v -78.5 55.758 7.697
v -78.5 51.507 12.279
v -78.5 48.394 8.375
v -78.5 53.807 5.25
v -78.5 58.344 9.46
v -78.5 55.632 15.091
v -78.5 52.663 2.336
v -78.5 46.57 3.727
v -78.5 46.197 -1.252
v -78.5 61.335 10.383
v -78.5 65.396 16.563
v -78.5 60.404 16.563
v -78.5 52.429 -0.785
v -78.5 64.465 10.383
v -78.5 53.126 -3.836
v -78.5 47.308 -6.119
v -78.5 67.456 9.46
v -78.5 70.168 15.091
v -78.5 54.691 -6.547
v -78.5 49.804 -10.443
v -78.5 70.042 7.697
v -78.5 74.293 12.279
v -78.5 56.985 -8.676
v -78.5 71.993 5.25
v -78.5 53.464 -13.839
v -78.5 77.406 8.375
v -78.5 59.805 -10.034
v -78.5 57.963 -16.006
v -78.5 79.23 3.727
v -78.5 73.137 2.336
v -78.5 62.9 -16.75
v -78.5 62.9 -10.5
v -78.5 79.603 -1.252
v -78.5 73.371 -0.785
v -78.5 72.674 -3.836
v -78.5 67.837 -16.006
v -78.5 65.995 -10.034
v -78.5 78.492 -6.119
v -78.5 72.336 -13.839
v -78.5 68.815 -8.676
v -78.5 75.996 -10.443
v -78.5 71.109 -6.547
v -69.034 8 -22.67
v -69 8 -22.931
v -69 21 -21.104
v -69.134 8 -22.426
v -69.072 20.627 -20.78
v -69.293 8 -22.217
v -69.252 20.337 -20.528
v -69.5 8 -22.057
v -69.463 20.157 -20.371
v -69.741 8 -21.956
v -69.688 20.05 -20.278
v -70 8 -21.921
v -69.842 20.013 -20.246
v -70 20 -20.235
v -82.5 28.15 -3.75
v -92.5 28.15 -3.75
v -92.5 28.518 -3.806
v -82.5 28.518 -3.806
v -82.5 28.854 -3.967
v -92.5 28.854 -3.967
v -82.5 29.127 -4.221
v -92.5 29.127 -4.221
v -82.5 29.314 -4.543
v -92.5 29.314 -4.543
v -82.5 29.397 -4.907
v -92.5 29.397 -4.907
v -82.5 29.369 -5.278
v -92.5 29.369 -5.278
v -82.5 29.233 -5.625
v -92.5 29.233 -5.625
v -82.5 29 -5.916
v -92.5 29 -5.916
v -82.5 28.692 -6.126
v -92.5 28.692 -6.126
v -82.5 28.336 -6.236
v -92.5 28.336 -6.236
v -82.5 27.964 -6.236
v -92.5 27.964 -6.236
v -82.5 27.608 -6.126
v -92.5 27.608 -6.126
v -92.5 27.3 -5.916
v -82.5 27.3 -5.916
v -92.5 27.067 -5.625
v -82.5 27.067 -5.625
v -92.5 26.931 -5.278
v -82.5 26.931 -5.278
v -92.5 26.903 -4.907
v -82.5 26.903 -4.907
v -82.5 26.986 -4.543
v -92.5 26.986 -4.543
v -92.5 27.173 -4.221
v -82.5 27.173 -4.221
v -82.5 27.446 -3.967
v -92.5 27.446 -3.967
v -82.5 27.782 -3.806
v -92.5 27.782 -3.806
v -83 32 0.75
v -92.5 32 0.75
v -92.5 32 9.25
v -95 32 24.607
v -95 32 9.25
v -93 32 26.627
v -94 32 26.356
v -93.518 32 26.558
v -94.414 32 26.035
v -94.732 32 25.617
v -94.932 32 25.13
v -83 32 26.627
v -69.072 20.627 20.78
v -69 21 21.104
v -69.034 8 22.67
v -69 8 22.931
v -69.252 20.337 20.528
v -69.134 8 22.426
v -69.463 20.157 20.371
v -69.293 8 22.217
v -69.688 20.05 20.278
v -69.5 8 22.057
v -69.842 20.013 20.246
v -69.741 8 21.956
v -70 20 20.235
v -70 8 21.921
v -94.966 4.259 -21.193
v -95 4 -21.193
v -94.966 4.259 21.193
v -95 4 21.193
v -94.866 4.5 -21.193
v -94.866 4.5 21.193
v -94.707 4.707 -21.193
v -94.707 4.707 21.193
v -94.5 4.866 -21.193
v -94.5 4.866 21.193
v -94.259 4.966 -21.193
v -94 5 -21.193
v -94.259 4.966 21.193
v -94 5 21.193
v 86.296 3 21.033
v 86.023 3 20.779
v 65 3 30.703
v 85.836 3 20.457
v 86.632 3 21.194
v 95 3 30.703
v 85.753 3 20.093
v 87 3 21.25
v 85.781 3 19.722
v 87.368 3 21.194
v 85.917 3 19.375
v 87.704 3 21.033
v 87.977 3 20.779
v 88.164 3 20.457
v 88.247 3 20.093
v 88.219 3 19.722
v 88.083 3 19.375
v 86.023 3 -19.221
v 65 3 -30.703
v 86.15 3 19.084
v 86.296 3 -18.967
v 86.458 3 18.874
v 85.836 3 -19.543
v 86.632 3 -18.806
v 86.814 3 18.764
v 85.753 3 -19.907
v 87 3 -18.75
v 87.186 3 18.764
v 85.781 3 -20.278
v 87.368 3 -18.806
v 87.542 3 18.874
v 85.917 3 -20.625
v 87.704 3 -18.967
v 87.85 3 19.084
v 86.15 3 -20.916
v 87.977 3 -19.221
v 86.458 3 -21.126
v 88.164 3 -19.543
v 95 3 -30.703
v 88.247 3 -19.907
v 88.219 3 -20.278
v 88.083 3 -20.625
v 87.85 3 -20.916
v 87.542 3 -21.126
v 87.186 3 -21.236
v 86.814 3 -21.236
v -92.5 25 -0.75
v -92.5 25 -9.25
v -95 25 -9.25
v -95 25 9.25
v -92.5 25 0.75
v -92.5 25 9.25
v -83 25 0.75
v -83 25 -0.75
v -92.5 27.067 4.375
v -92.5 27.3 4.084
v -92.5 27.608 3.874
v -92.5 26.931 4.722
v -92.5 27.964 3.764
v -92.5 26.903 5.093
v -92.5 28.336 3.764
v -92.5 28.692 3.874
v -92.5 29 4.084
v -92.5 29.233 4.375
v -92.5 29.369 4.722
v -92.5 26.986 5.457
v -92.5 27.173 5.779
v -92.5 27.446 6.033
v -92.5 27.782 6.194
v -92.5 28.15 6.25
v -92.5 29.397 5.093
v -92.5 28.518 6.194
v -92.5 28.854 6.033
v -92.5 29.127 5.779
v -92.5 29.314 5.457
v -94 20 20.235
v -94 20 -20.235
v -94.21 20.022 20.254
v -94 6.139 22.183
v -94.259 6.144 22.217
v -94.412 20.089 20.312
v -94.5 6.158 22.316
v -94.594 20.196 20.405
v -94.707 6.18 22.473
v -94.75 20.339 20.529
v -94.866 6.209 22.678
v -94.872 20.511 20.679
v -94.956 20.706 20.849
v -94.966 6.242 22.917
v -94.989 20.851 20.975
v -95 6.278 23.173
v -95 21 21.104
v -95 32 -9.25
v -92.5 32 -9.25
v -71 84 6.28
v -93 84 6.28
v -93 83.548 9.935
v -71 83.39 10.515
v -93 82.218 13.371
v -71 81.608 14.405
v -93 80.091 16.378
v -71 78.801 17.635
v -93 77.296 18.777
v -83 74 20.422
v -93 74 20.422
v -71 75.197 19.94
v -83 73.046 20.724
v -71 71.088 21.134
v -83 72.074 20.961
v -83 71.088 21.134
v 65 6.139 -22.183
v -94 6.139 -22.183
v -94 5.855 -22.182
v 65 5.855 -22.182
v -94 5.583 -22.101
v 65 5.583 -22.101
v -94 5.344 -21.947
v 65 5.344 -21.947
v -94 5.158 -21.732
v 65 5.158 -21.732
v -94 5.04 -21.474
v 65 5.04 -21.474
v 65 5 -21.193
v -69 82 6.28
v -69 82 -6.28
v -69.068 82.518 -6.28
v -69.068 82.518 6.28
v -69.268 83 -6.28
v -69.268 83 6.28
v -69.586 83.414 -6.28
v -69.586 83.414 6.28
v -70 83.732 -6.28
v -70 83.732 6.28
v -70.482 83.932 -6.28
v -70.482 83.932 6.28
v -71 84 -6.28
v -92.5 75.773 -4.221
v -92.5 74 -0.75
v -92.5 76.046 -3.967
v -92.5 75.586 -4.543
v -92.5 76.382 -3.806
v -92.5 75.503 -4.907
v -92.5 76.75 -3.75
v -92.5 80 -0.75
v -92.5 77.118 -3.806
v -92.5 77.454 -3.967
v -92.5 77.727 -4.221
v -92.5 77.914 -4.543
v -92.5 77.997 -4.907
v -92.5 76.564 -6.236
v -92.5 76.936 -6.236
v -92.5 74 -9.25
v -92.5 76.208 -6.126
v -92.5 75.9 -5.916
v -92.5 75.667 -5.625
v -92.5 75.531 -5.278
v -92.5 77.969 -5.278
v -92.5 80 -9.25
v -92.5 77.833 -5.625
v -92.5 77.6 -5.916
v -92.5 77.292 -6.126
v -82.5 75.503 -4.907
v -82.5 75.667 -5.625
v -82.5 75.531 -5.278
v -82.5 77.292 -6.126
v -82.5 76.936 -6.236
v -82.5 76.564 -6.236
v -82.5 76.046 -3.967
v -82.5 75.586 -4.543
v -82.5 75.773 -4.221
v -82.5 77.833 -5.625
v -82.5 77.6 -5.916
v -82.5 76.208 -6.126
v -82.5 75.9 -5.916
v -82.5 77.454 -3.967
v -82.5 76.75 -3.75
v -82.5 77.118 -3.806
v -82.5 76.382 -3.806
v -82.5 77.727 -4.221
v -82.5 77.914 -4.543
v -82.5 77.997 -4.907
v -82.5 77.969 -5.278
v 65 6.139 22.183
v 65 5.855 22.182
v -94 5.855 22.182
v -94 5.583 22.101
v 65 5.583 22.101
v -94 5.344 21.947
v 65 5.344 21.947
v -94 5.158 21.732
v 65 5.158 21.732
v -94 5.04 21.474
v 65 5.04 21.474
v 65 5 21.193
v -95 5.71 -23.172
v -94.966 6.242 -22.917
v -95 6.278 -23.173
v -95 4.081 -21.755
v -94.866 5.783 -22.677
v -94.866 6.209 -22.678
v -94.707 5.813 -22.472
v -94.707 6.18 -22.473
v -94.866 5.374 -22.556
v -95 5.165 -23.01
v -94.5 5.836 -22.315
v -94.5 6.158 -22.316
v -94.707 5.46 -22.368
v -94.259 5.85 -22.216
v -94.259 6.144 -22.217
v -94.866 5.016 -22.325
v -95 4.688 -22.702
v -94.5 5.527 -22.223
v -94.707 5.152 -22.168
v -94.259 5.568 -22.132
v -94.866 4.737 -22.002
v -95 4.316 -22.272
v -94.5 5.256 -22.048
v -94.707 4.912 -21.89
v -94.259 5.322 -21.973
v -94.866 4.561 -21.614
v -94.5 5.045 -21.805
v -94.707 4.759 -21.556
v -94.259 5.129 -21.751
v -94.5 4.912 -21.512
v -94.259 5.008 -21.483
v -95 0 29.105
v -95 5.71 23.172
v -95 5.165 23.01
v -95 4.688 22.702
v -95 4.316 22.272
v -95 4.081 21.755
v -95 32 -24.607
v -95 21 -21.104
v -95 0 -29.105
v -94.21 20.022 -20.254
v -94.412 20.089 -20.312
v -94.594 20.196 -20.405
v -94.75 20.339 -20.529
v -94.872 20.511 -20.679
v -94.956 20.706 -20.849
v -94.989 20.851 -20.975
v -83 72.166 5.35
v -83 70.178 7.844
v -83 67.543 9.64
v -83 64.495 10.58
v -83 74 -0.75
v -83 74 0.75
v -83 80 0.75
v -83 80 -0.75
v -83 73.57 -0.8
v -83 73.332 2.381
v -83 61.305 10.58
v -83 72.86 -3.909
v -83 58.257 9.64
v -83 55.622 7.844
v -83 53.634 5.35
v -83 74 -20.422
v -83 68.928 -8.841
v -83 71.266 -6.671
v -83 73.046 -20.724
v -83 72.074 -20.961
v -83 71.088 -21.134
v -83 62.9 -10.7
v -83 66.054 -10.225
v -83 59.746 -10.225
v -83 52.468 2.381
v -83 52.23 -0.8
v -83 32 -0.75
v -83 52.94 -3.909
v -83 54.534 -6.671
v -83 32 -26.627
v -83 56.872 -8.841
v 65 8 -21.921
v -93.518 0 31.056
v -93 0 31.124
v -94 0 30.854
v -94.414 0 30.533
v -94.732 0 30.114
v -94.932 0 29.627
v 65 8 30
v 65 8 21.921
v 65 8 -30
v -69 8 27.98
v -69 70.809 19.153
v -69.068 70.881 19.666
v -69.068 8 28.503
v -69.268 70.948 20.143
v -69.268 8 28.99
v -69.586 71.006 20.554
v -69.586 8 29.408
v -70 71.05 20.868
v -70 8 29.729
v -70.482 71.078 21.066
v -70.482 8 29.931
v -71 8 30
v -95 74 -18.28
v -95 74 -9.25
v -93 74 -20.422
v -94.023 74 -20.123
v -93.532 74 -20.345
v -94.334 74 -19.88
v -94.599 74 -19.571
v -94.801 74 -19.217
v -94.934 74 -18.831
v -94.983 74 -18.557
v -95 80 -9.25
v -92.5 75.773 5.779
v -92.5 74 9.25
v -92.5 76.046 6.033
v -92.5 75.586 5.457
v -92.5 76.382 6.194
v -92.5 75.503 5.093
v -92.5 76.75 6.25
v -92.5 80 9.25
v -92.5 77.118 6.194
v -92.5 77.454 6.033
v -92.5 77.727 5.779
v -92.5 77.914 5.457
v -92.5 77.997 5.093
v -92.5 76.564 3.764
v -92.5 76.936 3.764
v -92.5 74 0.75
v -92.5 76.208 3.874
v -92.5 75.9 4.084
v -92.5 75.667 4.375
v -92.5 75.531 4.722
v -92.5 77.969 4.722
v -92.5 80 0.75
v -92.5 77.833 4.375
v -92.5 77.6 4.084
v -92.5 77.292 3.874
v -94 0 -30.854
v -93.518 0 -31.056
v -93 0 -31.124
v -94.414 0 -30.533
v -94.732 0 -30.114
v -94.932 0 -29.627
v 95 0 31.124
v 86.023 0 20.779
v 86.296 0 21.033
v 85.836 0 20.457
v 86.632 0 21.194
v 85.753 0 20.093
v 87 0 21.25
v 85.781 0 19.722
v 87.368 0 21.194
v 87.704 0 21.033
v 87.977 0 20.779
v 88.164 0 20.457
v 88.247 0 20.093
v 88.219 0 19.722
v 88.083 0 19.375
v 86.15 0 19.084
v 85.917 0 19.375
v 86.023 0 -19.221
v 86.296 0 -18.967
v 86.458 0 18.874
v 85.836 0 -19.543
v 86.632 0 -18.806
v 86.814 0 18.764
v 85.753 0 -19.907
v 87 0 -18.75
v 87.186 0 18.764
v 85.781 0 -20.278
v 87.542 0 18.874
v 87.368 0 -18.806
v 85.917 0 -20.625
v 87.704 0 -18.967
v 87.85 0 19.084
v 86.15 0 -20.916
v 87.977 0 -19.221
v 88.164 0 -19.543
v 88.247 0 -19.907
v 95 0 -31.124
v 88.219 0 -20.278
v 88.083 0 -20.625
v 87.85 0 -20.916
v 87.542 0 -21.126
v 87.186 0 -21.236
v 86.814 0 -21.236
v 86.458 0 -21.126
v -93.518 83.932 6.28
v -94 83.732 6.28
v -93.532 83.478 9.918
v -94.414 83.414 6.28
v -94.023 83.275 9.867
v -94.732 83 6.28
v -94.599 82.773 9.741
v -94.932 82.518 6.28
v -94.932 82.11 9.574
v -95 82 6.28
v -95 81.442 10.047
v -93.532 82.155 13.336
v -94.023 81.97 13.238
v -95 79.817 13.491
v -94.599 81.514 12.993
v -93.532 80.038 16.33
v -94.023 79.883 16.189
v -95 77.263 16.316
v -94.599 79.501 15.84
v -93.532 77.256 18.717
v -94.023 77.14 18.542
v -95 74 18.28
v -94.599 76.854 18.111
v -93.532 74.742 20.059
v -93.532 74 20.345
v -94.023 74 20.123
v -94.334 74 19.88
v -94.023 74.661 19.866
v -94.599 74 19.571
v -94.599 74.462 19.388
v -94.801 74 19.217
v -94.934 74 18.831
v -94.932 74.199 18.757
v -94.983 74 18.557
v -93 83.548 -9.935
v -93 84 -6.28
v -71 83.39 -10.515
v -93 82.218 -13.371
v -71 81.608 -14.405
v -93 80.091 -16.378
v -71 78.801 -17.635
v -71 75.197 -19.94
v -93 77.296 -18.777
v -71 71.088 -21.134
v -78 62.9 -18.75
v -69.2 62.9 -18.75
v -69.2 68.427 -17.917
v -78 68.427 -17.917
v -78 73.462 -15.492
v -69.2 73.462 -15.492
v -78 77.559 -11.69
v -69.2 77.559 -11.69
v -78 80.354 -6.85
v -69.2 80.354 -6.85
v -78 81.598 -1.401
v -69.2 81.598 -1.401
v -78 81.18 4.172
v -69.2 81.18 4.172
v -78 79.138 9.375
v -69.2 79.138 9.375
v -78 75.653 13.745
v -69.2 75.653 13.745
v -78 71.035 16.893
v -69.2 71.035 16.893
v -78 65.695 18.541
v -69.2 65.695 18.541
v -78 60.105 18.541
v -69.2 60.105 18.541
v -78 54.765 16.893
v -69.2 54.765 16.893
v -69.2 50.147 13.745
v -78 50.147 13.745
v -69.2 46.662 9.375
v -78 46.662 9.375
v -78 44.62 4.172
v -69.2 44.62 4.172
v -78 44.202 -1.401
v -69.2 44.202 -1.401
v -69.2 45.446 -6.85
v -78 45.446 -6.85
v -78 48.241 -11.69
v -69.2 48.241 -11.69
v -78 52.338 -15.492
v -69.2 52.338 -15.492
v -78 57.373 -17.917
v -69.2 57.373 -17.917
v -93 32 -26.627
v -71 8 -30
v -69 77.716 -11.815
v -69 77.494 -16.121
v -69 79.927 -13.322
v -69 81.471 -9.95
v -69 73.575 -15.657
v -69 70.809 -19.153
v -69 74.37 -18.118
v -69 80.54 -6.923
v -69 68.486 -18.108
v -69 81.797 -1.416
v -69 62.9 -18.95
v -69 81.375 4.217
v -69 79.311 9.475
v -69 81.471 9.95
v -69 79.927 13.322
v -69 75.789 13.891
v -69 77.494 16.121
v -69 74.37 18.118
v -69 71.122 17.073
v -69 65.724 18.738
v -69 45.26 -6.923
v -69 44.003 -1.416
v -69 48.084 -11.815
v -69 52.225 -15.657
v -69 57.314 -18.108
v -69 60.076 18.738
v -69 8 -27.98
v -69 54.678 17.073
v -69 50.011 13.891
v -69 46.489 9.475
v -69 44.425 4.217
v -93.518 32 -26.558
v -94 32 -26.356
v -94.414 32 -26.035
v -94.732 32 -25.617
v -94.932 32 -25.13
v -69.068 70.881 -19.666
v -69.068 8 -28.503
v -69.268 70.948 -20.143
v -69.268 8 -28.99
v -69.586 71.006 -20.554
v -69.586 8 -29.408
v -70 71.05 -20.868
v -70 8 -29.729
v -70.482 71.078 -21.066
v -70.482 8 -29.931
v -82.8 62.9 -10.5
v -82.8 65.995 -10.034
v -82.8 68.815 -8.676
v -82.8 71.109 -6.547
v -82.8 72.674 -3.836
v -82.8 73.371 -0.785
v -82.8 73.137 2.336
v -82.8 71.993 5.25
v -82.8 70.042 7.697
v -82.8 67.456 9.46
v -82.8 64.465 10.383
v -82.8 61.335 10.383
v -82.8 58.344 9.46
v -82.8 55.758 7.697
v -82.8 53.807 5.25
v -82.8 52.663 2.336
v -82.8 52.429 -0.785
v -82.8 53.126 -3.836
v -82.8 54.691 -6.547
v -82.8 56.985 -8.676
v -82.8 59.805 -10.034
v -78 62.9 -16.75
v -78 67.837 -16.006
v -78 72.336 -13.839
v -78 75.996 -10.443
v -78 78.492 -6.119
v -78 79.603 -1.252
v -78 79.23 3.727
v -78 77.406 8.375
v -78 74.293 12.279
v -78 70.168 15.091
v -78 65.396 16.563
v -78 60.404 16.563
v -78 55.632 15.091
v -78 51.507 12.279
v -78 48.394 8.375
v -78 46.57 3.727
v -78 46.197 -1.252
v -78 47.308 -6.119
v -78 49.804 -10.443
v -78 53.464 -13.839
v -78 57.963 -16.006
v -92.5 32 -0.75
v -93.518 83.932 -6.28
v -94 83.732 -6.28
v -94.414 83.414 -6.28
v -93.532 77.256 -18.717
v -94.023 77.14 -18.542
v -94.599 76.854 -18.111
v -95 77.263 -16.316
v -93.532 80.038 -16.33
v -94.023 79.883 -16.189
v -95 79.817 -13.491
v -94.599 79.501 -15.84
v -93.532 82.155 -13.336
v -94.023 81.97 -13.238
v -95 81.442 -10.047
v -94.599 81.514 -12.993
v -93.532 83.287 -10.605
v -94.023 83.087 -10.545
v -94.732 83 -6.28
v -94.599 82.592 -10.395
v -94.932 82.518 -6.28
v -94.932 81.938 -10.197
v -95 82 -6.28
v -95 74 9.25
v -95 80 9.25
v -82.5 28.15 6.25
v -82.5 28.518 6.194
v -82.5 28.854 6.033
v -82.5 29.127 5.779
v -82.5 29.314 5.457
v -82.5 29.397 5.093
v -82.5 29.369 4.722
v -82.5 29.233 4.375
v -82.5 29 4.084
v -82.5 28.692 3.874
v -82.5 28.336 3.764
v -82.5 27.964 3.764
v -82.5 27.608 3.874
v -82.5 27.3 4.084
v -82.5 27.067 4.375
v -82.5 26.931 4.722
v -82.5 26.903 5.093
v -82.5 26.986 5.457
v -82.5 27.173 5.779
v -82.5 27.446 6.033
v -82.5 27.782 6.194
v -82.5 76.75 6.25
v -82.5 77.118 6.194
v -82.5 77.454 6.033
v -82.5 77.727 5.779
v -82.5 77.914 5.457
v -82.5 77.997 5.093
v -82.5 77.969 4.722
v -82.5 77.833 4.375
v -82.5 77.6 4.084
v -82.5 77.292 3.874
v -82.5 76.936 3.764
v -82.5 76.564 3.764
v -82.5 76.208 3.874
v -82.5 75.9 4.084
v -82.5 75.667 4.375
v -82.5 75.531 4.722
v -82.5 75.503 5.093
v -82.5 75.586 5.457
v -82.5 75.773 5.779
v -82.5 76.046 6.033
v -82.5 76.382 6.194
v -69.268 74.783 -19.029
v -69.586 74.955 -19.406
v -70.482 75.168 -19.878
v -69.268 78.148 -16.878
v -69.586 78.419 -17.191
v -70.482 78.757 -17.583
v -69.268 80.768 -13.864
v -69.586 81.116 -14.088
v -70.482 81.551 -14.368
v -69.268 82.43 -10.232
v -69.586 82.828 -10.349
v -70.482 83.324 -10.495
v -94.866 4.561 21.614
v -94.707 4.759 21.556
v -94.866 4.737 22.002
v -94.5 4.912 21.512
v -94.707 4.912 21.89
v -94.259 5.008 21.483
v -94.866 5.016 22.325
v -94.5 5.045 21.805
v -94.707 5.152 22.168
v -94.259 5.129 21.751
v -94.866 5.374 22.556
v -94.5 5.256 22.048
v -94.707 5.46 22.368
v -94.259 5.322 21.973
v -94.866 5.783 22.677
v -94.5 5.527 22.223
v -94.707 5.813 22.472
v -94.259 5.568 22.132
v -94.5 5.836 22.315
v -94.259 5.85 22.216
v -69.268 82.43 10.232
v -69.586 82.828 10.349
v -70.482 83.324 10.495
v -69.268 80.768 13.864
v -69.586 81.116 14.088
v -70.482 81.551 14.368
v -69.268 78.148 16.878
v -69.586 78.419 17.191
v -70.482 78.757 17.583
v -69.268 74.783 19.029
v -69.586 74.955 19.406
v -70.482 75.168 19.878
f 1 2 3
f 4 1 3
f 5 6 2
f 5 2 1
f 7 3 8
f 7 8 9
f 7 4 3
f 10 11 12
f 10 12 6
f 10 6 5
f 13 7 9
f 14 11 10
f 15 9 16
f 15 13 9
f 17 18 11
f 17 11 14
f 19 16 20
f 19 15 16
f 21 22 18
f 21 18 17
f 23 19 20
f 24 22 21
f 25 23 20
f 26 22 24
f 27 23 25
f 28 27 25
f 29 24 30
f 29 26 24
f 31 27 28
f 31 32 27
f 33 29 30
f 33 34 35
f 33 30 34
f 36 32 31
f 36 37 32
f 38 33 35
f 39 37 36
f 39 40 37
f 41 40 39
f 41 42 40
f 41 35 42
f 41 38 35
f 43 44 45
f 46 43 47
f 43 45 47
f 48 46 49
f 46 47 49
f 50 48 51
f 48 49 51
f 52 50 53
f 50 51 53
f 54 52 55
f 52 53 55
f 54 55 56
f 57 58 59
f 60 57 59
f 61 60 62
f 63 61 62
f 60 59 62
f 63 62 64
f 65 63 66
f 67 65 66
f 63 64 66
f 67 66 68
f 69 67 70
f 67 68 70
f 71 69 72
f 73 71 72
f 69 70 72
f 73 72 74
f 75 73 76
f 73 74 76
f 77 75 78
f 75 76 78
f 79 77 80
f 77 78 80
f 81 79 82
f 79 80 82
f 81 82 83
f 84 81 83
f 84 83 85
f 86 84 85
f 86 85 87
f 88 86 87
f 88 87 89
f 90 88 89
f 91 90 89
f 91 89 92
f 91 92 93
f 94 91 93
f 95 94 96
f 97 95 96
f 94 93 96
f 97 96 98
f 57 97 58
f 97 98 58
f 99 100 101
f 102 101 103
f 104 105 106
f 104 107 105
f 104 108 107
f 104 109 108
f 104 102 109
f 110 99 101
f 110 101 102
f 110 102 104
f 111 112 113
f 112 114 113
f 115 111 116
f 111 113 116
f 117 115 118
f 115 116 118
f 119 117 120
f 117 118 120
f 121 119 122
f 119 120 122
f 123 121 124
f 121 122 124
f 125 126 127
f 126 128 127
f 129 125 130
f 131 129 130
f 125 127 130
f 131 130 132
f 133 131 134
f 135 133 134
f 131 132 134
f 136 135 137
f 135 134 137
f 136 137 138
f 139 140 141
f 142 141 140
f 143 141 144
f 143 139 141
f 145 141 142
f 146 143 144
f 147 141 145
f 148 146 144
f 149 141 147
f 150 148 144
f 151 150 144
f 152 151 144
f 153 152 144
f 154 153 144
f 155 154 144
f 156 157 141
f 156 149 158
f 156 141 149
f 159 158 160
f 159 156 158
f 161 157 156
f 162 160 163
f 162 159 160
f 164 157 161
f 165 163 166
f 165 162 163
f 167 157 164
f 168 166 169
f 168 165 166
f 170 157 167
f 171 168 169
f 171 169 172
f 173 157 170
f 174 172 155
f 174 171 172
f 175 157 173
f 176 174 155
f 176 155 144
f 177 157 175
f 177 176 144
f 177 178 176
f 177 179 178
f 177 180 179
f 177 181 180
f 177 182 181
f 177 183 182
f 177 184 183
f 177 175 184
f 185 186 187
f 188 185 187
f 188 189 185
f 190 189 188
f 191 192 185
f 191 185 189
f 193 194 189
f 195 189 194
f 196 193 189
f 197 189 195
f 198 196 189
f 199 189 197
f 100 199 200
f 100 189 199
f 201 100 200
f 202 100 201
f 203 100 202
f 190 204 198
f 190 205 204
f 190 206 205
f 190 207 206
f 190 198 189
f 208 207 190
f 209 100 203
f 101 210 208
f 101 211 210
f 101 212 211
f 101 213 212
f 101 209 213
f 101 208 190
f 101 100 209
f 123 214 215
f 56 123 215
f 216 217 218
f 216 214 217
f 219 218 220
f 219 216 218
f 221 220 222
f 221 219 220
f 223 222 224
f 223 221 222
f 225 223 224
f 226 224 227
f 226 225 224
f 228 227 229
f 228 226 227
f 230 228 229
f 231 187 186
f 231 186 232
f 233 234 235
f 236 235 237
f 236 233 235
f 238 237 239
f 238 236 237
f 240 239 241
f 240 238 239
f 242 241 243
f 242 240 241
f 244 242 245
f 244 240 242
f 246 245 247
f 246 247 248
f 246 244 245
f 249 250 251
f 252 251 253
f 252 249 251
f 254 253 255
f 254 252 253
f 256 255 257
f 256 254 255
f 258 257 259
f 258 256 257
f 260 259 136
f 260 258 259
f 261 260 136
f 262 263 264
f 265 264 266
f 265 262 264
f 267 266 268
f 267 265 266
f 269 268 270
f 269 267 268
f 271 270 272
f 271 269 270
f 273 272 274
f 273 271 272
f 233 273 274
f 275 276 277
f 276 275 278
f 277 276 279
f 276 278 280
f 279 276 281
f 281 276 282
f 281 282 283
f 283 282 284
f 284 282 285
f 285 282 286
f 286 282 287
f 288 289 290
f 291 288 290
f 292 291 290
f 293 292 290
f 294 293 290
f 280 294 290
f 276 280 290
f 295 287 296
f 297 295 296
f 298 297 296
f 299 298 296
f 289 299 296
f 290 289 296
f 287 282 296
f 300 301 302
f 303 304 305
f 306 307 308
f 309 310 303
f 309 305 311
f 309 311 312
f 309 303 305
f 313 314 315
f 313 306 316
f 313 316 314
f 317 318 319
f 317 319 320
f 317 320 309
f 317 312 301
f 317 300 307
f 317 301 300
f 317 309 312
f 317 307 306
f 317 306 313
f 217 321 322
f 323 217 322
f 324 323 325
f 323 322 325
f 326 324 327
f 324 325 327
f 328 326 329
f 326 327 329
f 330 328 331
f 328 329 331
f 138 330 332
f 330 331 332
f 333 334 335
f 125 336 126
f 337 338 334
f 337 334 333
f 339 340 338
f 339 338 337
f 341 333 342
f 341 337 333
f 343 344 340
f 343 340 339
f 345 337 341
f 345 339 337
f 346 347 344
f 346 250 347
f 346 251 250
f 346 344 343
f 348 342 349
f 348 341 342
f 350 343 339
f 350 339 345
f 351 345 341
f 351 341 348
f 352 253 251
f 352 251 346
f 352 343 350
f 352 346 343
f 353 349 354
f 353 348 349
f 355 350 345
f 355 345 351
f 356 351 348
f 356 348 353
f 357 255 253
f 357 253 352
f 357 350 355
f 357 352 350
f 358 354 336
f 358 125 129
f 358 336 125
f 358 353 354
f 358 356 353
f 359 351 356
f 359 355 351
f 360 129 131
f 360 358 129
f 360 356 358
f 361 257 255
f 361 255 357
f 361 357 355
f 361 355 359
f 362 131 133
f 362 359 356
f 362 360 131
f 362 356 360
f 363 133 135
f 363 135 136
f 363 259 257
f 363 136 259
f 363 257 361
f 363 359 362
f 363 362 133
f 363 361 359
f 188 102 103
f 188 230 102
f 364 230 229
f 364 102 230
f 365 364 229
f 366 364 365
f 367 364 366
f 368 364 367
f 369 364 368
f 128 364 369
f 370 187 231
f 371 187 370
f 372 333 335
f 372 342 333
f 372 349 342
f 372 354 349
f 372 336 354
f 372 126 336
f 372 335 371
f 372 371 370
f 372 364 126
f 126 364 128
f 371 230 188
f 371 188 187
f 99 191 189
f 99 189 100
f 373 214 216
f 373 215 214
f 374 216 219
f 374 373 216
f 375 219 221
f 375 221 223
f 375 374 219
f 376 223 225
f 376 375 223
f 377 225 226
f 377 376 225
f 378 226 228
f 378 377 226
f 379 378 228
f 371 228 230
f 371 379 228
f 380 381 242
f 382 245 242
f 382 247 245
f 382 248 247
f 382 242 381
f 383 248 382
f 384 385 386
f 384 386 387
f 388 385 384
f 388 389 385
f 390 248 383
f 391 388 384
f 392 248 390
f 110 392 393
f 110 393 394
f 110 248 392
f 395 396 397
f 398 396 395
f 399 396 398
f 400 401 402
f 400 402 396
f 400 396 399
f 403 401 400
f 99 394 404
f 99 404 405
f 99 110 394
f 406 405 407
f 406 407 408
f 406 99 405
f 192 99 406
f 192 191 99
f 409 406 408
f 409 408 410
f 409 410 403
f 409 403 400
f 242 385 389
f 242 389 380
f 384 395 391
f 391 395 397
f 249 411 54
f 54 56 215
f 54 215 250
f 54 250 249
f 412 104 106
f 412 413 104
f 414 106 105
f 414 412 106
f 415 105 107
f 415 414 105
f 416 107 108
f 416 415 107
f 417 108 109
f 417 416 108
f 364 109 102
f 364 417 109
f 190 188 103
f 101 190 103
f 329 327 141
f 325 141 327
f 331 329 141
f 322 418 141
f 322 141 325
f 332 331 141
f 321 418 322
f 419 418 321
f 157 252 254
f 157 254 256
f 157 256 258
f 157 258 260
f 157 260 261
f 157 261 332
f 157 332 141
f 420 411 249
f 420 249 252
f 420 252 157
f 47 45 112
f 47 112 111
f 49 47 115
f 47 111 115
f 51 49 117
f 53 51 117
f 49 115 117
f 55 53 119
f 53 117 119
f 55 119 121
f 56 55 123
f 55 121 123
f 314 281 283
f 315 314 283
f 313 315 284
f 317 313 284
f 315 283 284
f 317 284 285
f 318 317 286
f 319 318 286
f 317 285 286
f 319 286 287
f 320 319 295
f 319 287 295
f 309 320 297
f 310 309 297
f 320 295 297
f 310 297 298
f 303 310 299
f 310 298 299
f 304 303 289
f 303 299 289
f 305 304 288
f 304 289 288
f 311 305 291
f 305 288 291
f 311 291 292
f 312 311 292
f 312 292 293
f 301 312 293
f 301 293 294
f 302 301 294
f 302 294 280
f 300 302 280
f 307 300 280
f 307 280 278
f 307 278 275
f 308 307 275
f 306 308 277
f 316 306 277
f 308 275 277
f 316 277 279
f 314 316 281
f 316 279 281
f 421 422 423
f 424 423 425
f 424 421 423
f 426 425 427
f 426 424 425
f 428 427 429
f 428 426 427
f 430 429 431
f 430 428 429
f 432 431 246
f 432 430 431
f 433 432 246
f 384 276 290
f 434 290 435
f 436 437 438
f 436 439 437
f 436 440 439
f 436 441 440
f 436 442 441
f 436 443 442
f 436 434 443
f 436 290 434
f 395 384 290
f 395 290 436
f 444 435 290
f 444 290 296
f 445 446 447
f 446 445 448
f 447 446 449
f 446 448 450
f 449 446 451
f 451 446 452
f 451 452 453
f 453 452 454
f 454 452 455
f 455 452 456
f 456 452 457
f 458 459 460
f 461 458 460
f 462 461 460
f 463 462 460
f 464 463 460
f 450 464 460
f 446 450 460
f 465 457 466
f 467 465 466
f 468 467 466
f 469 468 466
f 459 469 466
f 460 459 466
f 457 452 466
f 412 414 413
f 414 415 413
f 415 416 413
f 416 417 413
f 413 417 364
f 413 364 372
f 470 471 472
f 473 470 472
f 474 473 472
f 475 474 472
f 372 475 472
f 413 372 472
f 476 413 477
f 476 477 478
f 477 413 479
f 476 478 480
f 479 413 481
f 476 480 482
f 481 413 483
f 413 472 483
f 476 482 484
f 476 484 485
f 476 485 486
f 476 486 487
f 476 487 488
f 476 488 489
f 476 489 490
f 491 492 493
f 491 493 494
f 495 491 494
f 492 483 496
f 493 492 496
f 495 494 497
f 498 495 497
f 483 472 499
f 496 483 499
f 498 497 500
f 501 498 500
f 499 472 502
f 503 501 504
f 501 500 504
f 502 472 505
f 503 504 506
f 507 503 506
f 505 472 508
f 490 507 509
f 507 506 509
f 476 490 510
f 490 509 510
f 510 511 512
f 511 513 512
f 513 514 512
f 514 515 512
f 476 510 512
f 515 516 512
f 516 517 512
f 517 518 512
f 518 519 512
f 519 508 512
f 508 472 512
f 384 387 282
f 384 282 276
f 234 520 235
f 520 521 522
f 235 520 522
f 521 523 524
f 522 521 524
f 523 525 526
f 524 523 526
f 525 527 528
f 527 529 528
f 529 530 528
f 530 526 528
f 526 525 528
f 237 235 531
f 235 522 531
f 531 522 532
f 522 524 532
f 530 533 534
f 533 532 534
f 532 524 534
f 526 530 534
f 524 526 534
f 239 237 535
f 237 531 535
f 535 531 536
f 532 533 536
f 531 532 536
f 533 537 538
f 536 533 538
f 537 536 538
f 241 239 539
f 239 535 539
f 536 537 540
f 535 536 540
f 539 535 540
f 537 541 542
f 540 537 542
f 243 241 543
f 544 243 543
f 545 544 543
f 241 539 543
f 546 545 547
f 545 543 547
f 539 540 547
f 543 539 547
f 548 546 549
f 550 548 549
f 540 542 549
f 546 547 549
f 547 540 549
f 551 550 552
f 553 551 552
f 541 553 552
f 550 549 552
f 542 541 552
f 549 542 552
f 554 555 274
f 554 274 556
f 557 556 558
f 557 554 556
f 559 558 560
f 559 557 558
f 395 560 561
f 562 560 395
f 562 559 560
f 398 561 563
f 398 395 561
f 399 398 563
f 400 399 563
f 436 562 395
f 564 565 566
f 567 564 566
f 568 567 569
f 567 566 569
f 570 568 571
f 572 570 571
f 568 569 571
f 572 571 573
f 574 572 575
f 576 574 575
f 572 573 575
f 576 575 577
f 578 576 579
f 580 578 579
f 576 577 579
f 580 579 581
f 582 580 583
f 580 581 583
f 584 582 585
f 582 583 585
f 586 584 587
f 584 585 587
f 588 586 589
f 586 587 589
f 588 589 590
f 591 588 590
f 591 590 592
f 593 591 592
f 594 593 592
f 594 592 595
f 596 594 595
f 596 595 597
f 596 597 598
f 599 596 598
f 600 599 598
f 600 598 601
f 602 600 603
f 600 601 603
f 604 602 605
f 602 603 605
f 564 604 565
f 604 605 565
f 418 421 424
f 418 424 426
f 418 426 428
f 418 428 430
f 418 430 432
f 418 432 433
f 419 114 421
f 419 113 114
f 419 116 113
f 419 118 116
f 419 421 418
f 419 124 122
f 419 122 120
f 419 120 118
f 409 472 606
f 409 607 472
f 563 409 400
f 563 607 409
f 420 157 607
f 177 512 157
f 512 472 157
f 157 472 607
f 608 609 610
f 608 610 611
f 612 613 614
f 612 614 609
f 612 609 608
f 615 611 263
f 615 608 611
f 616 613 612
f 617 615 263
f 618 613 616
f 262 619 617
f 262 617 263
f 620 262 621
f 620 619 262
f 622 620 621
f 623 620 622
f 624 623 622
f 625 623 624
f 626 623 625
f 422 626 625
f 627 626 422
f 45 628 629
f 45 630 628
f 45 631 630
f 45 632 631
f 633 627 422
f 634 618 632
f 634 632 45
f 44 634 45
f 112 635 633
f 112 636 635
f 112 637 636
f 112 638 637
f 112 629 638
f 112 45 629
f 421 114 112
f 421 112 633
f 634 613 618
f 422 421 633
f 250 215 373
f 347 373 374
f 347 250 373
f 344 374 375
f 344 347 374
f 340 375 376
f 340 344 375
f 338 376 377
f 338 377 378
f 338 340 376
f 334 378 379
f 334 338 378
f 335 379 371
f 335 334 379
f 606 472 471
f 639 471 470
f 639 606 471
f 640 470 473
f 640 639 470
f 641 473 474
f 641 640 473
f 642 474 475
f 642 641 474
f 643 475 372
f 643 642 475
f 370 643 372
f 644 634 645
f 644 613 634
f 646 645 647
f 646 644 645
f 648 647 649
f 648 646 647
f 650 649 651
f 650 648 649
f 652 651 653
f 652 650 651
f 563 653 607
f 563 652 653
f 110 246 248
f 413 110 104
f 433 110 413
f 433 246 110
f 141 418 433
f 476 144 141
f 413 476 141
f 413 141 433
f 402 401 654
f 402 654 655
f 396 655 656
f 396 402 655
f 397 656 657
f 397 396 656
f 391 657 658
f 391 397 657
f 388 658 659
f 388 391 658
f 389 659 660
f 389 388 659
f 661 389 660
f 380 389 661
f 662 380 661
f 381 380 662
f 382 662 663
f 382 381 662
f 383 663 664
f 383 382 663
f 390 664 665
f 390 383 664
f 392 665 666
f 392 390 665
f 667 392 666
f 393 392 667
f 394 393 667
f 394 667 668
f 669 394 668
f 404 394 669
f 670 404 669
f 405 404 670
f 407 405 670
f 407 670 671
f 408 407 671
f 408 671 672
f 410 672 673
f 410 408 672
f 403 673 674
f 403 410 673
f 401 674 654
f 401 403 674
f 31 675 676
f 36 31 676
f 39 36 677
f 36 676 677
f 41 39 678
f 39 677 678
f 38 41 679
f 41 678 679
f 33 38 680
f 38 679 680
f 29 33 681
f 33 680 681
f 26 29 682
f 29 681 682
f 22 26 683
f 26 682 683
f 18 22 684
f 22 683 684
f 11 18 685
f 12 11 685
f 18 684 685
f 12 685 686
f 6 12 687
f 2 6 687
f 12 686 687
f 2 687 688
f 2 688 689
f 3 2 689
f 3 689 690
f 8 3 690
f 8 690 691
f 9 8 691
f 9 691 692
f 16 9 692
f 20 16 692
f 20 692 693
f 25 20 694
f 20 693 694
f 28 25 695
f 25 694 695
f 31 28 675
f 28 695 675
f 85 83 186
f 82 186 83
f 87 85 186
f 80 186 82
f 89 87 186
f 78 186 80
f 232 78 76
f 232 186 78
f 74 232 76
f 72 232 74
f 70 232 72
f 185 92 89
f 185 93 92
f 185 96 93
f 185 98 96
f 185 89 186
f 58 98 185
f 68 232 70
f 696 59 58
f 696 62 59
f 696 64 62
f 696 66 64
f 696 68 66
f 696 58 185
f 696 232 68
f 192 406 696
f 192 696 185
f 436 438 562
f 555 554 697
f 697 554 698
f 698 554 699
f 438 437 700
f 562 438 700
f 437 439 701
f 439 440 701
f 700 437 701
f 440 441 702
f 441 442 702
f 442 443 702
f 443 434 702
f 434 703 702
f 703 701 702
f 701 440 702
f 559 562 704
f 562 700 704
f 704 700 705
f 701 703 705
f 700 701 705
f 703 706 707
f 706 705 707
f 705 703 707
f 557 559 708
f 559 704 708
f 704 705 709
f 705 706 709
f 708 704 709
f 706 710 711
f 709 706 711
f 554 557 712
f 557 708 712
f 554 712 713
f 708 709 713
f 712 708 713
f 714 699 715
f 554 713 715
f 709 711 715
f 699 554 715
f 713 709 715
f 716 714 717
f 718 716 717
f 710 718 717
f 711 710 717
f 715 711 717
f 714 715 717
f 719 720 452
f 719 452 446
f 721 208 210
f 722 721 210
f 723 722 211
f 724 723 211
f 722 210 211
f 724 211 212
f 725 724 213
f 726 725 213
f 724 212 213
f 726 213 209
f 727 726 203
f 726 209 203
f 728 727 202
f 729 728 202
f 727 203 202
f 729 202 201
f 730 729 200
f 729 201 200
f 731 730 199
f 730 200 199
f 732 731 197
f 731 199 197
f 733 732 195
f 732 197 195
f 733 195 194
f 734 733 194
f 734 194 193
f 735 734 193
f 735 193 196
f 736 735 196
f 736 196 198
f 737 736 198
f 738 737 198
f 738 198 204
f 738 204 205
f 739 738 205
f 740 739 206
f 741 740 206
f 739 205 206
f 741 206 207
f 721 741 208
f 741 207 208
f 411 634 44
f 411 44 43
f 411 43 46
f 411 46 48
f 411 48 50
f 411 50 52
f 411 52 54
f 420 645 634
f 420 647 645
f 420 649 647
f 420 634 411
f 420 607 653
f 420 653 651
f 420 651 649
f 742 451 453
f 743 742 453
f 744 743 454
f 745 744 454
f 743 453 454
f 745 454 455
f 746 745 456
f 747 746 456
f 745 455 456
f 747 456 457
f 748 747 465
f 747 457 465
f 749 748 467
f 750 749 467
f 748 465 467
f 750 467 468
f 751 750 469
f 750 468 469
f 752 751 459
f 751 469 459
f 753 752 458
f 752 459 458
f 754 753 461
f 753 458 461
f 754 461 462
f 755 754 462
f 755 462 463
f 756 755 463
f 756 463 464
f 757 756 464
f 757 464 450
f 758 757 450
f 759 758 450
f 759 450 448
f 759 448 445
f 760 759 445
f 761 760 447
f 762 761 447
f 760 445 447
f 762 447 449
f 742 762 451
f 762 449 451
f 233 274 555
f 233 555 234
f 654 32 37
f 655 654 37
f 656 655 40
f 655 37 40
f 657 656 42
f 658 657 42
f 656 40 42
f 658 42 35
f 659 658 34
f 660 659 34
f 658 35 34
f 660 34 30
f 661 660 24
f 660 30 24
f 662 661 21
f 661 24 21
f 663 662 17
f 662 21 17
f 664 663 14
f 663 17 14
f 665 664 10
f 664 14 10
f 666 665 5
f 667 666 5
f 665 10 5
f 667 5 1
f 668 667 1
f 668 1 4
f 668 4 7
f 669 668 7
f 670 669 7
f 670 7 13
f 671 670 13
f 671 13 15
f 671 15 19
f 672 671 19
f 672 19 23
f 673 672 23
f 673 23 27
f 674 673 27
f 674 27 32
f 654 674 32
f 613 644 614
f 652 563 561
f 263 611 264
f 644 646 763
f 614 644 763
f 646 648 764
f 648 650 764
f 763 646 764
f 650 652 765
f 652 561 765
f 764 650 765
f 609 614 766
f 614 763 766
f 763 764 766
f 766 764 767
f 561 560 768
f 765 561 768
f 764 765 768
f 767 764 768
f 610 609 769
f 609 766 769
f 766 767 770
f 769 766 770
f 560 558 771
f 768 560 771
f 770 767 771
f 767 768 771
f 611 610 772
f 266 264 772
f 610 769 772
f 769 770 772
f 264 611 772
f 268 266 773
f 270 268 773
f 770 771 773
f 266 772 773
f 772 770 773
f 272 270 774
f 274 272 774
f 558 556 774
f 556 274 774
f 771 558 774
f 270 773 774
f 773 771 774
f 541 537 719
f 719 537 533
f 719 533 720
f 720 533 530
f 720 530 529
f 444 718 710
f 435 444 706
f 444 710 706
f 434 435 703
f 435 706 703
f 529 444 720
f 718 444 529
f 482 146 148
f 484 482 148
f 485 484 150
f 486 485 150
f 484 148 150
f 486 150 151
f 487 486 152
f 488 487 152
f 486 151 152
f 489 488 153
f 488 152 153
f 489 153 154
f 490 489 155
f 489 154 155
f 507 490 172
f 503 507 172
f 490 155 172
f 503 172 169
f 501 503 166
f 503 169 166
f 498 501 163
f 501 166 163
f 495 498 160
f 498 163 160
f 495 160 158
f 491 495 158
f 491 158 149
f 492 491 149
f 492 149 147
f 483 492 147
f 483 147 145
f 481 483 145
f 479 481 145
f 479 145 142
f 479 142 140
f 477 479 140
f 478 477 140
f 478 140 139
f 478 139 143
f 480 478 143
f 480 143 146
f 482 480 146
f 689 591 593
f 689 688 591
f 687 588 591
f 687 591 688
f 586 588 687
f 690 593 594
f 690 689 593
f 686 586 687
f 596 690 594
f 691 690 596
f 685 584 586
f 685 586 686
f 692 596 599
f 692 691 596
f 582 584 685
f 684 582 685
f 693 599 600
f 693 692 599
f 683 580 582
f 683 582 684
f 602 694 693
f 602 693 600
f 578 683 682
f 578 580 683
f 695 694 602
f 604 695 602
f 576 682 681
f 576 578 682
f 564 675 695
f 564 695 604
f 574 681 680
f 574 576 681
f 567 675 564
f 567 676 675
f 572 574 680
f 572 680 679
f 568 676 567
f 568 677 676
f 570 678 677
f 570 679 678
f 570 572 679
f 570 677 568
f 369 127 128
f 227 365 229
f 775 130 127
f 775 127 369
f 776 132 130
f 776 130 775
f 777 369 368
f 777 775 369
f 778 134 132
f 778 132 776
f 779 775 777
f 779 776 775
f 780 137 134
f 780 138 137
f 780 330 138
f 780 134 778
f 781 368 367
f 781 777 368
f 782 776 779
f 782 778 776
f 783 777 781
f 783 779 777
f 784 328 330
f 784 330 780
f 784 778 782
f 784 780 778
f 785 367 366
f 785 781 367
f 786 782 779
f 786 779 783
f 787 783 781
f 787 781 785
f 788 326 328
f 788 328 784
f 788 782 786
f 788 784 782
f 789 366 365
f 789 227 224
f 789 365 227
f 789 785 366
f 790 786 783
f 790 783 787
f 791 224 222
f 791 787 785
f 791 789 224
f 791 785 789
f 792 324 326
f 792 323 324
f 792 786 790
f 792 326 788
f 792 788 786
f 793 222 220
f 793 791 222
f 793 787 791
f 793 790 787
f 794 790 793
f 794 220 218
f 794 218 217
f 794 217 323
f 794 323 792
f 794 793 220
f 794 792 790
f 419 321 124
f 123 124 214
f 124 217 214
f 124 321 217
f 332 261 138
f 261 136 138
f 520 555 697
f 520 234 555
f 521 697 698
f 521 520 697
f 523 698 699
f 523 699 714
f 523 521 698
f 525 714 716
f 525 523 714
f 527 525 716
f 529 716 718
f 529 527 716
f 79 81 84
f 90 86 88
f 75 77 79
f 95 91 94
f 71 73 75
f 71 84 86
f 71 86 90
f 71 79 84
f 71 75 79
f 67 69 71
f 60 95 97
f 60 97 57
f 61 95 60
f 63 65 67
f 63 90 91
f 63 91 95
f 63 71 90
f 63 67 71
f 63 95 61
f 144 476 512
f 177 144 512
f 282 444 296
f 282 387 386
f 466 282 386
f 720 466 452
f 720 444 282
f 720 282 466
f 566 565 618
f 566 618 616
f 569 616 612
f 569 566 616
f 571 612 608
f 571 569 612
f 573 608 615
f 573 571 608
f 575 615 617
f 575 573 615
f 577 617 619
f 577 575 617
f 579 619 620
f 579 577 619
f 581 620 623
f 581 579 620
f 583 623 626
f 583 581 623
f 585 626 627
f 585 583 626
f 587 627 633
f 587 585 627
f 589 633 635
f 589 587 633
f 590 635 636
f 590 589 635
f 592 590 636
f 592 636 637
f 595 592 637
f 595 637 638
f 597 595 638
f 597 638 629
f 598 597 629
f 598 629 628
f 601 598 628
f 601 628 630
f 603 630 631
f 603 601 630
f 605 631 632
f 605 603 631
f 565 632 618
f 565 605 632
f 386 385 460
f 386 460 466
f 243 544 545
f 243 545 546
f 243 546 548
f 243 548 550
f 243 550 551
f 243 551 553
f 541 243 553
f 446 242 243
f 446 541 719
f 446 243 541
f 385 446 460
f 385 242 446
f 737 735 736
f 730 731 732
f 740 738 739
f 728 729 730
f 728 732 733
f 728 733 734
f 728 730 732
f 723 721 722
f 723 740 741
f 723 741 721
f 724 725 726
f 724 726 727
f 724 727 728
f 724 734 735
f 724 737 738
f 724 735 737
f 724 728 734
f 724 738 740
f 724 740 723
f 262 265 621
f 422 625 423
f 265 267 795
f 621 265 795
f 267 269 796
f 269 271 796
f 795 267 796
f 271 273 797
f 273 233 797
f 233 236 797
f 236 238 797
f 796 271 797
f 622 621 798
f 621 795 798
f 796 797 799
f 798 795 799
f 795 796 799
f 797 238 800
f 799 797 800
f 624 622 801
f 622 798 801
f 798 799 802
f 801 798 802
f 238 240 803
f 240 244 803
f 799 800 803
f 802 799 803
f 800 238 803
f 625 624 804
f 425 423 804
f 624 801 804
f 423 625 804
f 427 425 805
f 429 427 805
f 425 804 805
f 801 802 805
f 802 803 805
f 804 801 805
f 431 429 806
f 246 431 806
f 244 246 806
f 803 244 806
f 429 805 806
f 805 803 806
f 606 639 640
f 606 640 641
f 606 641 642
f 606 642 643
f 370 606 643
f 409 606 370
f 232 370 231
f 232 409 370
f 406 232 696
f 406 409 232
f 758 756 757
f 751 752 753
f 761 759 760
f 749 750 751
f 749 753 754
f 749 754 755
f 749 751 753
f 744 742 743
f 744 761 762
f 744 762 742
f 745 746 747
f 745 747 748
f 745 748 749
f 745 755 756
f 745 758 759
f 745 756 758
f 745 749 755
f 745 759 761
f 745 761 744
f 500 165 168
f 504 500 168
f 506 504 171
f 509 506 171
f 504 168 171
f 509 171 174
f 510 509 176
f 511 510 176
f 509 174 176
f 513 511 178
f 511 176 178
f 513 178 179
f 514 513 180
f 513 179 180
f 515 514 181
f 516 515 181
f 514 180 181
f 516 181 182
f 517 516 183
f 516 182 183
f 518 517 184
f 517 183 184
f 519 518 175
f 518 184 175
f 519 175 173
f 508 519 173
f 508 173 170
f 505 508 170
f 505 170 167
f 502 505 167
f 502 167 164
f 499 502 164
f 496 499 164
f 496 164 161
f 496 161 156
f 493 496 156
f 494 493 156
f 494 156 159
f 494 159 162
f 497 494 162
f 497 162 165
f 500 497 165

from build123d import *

# Parameters (mm, degrees)
SKETCH_1_W          = 190
SKETCH_1_H          = 60.00000000000001
EXTRUDE_1_DEPTH     = 8
EXTRUDE_2_DEPTH     = 76
SKETCH_3_W          = 29.999999999999986
SKETCH_3_H          = 60
CUT_EXTRUDE_1_DEPTH = 5
DRAFT_1_ANGLE       = 8.000000000000018
EXTRUDE_3_DEPTH     = 12
SKETCH_5_W          = 18.5
SKETCH_5_H          = 6.9999999999999964
CUT_EXTRUDE_2_DEPTH = 2.5
CUT_EXTRUDE_3_DEPTH = 211.0588577307207
SKETCH_7_R          = 18.750000000000007
CUT_EXTRUDE_4_DEPTH = 9
SKETCH_8_R          = 10.499999999999996
CUT_EXTRUDE_5_DEPTH = 195.81715456071922
SKETCH_10_R         = 16.750000000000007
CUT_EXTRUDE_7_DEPTH = 0.5
FILLET_2_R          = 15
FILLET_3_R          = 1
CHAMFER_1_SIZE      = 0.2
FILLET_4_R          = 2
SKETCH_9_R          = 1.2500000000000004
CUT_EXTRUDE_6_DEPTH = 10
SKETCH_11_R         = 1.2499999999999978
CUT_EXTRUDE_9_DEPTH = 129.66516135432758


with BuildPart() as part:
    # 스케치1 → 보스-돌출1 (new body)
    with BuildSketch(Plane(origin=(0, 0, 0), x_dir=(1, 0, 0), z_dir=(0, 1, 0))):
        Rectangle(SKETCH_1_W, SKETCH_1_H)
    extrude(amount=EXTRUDE_1_DEPTH)

    # 스케치2 → 보스-돌출2 (add)
    with BuildSketch(Plane(origin=(0, 8, 0), x_dir=(1, 0, 0), z_dir=(0, 1, 0))):
        Polygon((-68.99999999999997, -29.999999999999993), (-82.99999999999999, -29.999999999999996), (-82.99999999999997, 30), (-68.99999999999997, 30.000000000000004), align=None)
    extrude(amount=EXTRUDE_2_DEPTH)

    # 스케치3 → 컷-돌출1 (cut)
    with BuildSketch(Plane(origin=(0, 8, 0), x_dir=(1, 0, 0), z_dir=(0, 1, 0))):
        with Locations((80, 3.55e-15)):
            Rectangle(SKETCH_3_W, SKETCH_3_H)
    extrude(amount=-CUT_EXTRUDE_1_DEPTH, mode=Mode.SUBTRACT)

    # 구배1
    draft_1_faces = [part.faces().sort_by_distance(p)[0] for p in [
        (1.421e-14, 2.0774022239325727, -30),
        (1.421e-14, 2.0774022239325727, 30),
    ]]
    draft(draft_1_faces, Plane.ZX.offset(8), DRAFT_1_ANGLE)

    # 스케치4 → 보스-돌출3 (add)
    with BuildSketch(Plane.ZY.offset(82.99999999999997)):
        Polygon((-19.318896562618214, 83.99999999999999), (19.318896562618214, 83.99999999999999), (20.724304909642164, 74), (0.7500000000000067, 74), (0.7500000000000067, 80), (-0.7499999999999934, 80), (-0.7499999999999934, 74), (-20.724304909642132, 74), align=None)
        Polygon((0.7500000000000067, 32), (26.627019967142623, 32), (30.000000000000014, 8), (-29.999999999999986, 8), (-26.627019967142584, 32), (-0.7499999999999934, 32), (-0.7499999999999934, 25), (0.7500000000000067, 25), align=None)
    extrude(amount=EXTRUDE_3_DEPTH)

    # 스케치5 → 컷-돌출2 (cut)
    with BuildSketch(Plane.ZY.offset(94.99999999999999)):
        Polygon((-9.25, 80), (9.25, 80.00000000000001), (9.250000000000002, 74), (-9.249999999999998, 74), align=None)
        with Locations((-1.78e-15, 28.5)):
            Rectangle(SKETCH_5_W, SKETCH_5_H)
    extrude(amount=-CUT_EXTRUDE_2_DEPTH, mode=Mode.SUBTRACT)

    # 스케치6 → 컷-돌출3 (cut, through all)
    with BuildSketch(Plane.ZY.offset(94.99999999999999)):
        Polygon((-20.234889403422354, 20), (-22.34300192395823, 4.999999999999996), (22.343001923958226, 5.000000000000001), (20.23488940342236, 20), align=None)
    extrude(amount=-CUT_EXTRUDE_3_DEPTH, mode=Mode.SUBTRACT)

    # 스케치7 → 컷-돌출4 (cut)
    with BuildSketch(Plane(origin=(-68.99999999999997, 0, 0), x_dir=(0, 0, -1), z_dir=(1, 0, 0))):
        with Locations((2.22e-15, 62.9)):
            Circle(SKETCH_7_R)
    extrude(amount=-CUT_EXTRUDE_4_DEPTH, mode=Mode.SUBTRACT)

    # 스케치8 → 컷-돌출5 (cut, through all)
    with BuildSketch(Plane(origin=(-77.99999999999997, 0, 0), x_dir=(0, 0, -1), z_dir=(1, 0, 0))):
        with Locations((2.22e-15, 62.9)):
            Circle(SKETCH_8_R)
    extrude(amount=-CUT_EXTRUDE_5_DEPTH, mode=Mode.SUBTRACT)

    # 스케치10 → 컷-돌출7 (cut)
    with BuildSketch(Plane(origin=(-77.99999999999997, 0, 0), x_dir=(0, 0, -1), z_dir=(1, 0, 0))):
        with Locations((2.22e-15, 62.9)):
            Circle(SKETCH_10_R)
    extrude(amount=-CUT_EXTRUDE_7_DEPTH, mode=Mode.SUBTRACT)

    # 필렛2
    fillet_2_edges = [part.edges().sort_by_distance(p)[0] for p in [
        (-81.99999999999997, 84, -19.31889656261823),
        (-81.99999999999997, 84, 19.318896562618217),
    ]]
    fillet(fillet_2_edges, radius=FILLET_2_R)

    # 필렛3
    fillet_3_edges = [part.edges().sort_by_distance(p)[0] for p in [
        (-68.99999999999997, 20, 3.55e-15),
        (-68.99999999999997, 14, 21.078134411636704),
        (-14.999999999999986, 5.000000000000001, 22.343001923958226),
        (-68.99999999999997, 14, -21.078134411636704),
        (-14.999999999999986, 4.999999999999996, -22.34300192395823),
        (-94.99999999999999, 20, 3.55e-15),
        (-94.99999999999999, 12.499999999999998, -21.288945663690292),
        (-94.99999999999999, 4.999999999999998, -3.55e-15),
        (-94.99999999999999, 12.5, 21.288945663690292),
    ]]
    fillet(fillet_3_edges, radius=FILLET_3_R)

    # 모따기1
    chamfer_1_edges = [part.edges().sort_by_distance(p)[0] for p in [
        (-68.99999999999997, 62.9, 18.750000000000004),
        (-82.99999999999999, 62.9, 10.499999999999995),
    ]]
    chamfer(chamfer_1_edges, length=CHAMFER_1_SIZE)

    # 필렛4
    fillet_4_edges = [part.edges().sort_by_distance(p)[0] for p in [
        (-94.99999999999997, 83.99999999999999, -1.365e-14),
        (-68.99999999999997, 84, 0),
        (-68.99999999999997, 39.54379825720049, -25.566808263249197),
        (-68.99999999999997, 39.54379825720049, 25.566808263249193),
        (-68.99999999999999, 80.32064370334157, -16.120480930232446),
        (-68.99999999999999, 80.32064370334157, 16.120480930232446),
        (-94.99999999999999, 81.24744871391589, -14.93984953321921),
        (-94.99999999999999, 81.24744871391587, 14.939849533219187),
        (-94.99999999999997, 16, 28.87567332238087),
        (-94.99999999999999, 16, -28.875673322380862),
    ]]
    fillet(fillet_4_edges, radius=FILLET_4_R)

    # 스케치9 → 컷-돌출6 (cut)
    with BuildSketch(Plane.ZY.offset(92.49999999999999)):
        with Locations((-5.000000000000003, 76.75000000000001)):
            Circle(SKETCH_9_R)
        with Locations((4.999999999999997, 76.75)):
            Circle(SKETCH_9_R)
        with Locations((-4.9999999999999964, 28.150000000000002)):
            Circle(SKETCH_9_R)
        with Locations((5.000000000000004, 28.150000000000002)):
            Circle(SKETCH_9_R)
    extrude(amount=-CUT_EXTRUDE_6_DEPTH, mode=Mode.SUBTRACT)

    # 스케치11 → 컷-돌출9 (cut, through all)
    with BuildSketch(Plane(origin=(0, 3, 0), x_dir=(1, 0, 0), z_dir=(0, 1, 0))):
        with Locations(Location((87.00000000000003, 19.999999999999996, 0), (0, 0, 270))):
            Circle(SKETCH_11_R)
        with Locations(Location((87.00000000000003, -20.000000000000004, 0), (0, 0, 270))):
            Circle(SKETCH_11_R)
    extrude(amount=-CUT_EXTRUDE_9_DEPTH, mode=Mode.SUBTRACT)


solid = part.part
